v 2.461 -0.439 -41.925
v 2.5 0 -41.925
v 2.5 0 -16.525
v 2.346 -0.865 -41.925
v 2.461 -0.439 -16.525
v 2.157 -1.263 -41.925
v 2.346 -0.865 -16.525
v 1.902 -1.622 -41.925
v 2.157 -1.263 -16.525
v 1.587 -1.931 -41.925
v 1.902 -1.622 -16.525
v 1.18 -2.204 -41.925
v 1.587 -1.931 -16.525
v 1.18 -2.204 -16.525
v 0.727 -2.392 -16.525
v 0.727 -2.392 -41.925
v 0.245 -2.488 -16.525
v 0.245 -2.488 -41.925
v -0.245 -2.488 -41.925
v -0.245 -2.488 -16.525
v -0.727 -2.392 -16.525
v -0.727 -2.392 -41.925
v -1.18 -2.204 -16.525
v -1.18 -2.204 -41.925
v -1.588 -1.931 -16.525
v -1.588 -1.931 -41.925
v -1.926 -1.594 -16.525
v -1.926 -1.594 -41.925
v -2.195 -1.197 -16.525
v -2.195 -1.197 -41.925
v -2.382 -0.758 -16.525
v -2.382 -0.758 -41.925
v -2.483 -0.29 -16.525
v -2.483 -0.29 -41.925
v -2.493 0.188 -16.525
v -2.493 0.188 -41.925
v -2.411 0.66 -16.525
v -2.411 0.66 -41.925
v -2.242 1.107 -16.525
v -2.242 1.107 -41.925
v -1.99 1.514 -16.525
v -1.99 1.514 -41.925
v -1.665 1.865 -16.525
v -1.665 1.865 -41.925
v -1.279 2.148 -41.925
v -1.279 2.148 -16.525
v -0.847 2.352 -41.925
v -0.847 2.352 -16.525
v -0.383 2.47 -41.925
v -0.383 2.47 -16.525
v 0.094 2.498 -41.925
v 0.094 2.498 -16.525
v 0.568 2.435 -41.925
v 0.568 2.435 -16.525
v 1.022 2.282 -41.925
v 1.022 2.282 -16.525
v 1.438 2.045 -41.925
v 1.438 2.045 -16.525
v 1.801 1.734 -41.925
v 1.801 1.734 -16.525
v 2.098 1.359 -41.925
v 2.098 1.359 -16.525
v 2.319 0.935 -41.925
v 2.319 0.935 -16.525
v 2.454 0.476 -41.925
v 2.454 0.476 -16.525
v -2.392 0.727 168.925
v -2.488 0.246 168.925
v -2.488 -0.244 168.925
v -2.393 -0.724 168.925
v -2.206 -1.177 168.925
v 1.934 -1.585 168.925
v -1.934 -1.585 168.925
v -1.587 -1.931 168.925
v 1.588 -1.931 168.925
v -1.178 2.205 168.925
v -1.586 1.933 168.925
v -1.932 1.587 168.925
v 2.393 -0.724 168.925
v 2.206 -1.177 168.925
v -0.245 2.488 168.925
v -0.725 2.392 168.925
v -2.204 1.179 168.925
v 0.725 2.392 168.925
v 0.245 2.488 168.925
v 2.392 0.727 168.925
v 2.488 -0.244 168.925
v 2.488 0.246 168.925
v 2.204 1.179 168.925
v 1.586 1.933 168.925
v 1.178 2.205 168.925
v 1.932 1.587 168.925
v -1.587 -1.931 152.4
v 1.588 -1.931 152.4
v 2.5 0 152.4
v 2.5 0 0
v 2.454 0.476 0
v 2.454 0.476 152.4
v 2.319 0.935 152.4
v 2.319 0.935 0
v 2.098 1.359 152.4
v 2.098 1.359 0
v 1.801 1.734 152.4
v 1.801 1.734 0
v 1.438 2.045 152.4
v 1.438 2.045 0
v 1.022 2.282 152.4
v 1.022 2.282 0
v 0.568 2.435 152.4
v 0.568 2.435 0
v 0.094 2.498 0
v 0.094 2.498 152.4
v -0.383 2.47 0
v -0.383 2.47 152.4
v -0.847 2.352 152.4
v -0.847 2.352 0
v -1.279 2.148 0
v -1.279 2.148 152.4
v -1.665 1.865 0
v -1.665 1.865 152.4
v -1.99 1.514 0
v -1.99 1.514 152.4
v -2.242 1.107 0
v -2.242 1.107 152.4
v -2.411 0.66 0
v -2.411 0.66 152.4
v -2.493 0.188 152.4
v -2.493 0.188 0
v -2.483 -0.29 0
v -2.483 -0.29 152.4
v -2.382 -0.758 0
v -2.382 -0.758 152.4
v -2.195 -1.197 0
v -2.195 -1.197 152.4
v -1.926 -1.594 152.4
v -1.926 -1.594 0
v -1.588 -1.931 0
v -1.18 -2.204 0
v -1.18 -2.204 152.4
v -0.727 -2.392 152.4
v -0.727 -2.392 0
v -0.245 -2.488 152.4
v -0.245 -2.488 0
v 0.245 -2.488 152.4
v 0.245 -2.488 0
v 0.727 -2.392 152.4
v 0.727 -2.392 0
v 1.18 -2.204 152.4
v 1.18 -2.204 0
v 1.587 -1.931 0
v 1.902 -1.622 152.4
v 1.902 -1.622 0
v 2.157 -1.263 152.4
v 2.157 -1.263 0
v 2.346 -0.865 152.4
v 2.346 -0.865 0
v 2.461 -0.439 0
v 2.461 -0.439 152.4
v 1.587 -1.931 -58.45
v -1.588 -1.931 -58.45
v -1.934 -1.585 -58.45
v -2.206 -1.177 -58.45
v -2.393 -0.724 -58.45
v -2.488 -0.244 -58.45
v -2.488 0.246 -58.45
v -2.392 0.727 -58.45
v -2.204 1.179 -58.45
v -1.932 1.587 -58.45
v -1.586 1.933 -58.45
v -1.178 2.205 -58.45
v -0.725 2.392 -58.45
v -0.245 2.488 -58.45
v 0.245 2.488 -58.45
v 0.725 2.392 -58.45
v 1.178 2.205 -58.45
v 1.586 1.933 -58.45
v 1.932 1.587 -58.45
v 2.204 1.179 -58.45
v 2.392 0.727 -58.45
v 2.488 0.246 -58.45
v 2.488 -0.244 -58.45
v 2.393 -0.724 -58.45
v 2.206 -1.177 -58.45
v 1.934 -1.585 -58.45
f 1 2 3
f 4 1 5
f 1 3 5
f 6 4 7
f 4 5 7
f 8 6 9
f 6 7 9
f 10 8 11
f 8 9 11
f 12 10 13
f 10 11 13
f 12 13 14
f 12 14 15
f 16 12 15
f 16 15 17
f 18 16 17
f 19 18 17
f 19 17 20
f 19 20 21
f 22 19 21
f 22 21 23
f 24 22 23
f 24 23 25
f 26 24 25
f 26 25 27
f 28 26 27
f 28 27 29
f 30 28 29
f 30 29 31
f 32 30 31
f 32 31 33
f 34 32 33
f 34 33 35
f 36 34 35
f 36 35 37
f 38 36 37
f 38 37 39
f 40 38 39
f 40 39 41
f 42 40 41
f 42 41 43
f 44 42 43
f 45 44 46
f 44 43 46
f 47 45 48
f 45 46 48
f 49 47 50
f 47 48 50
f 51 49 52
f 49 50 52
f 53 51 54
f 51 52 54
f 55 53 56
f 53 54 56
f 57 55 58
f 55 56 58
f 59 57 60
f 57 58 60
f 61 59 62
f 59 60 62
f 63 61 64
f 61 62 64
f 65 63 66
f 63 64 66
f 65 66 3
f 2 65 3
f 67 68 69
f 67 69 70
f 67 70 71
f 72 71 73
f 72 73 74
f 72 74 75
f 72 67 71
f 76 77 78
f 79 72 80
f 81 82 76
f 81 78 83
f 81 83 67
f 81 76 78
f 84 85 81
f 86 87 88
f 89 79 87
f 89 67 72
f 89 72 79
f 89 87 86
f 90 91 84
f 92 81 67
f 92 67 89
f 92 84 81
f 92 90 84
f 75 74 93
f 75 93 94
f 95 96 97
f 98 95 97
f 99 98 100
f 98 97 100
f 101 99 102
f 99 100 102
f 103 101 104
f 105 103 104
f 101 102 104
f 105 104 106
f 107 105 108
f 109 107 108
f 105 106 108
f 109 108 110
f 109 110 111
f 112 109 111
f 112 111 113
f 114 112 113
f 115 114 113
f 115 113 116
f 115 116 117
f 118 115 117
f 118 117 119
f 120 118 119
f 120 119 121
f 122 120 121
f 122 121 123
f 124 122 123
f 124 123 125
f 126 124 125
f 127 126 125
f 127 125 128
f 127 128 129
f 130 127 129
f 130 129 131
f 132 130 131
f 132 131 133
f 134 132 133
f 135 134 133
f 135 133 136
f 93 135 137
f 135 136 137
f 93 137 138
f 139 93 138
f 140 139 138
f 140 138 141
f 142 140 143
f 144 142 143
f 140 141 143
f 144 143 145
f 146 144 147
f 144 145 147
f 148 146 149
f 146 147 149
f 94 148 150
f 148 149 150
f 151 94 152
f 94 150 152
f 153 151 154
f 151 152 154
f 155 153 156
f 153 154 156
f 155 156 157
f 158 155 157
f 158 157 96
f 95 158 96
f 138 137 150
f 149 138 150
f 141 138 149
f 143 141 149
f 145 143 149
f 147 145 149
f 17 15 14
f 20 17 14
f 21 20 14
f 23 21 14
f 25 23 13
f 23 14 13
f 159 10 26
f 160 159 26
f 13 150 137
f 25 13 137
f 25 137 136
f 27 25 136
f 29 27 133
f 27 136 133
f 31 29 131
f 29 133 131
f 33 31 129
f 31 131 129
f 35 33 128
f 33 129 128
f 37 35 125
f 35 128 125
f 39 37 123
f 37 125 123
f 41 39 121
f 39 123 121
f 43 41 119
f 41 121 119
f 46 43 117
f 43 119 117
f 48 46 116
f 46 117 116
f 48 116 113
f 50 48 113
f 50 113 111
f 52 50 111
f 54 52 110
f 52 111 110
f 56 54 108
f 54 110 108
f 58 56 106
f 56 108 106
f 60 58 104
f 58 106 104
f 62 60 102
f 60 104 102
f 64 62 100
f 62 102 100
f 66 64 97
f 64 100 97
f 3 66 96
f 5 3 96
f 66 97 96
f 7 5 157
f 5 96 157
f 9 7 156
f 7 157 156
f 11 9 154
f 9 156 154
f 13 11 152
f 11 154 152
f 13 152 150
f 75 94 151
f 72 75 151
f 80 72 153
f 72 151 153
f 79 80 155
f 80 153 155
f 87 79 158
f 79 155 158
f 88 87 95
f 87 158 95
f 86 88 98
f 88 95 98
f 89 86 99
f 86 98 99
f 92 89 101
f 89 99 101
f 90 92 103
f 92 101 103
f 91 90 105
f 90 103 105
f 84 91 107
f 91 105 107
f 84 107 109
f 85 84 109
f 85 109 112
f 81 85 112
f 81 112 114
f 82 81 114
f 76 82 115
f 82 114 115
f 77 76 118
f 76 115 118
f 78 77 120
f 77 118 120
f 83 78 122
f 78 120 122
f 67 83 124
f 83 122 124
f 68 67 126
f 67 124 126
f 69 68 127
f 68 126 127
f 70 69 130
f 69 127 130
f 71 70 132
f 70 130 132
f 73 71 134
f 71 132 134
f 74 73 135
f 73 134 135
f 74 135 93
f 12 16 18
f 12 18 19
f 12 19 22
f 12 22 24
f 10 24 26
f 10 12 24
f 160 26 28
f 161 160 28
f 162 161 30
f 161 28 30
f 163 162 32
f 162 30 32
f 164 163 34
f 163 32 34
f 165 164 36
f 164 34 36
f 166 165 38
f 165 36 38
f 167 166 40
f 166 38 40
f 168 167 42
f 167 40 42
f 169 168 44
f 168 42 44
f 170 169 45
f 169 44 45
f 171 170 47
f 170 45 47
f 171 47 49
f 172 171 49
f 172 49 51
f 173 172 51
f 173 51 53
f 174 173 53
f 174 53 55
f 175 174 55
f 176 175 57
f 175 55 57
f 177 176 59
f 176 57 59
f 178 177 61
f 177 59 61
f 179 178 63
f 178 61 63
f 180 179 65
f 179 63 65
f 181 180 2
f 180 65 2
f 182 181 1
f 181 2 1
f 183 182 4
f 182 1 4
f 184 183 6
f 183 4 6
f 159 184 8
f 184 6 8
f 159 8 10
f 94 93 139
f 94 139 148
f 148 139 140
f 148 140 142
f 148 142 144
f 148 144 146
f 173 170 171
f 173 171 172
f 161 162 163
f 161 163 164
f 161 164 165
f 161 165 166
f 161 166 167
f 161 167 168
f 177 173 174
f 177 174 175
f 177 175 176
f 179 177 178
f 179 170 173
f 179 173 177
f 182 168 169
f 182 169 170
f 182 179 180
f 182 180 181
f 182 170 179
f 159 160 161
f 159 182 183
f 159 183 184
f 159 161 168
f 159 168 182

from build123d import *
from build123d import SkipClean  # not in build123d's __all__

# Parameters (mm, degrees)
F0_R     = 2.5
F1_DEPTH = 152.4
F3_DEPTH = 16.5250114
F5_DEPTH = 16.5250114
F6_R     = 2.5
F7_DEPTH = 25.4
F9_DEPTH = 16.5250114


# Not quite as in the source:
# - after a boolean that leaves OpenCascade's solid faulty, fix() repairs it


with BuildPart() as f1:
    # F0 (on Top) → F1 (new body)
    with BuildSketch(Plane.XY):
        Circle(F0_R)
    extrude(amount=F1_DEPTH)

    # F2 (on face) → F3 (join)
    with BuildSketch(Plane.XY.offset(152.4)):
        with BuildLine():
            Line((0, -1.9312803396), (1.5875, -1.9312803396))
            ThreePointArc((1.5875, -1.9312803396), (0, 2.5), (-1.5875, -1.9312803396))
            Line((-1.5875, -1.9312803396), (0, -1.9312803396))
        make_face()
    extrude(amount=F3_DEPTH)

    # F4 (on face) → F5 (join)
    with BuildSketch(Plane(origin=(0, 0, 0), x_dir=(1, 0, 0), z_dir=(0, 0, -1))):
        with BuildLine():
            Line((1.5875, 1.9312803396), (-1.5875, 1.9312803396))
            ThreePointArc((-1.5875, 1.9312803396), (0, -2.5), (1.5875, 1.9312803396))
        make_face()
    with SkipClean():  # cleaning this boolean's faces spoils the solid; the shape is the same uncleaned
        extrude(amount=F5_DEPTH)

    # F6 (on face) → F7 (join)
    with BuildSketch(Plane(origin=(0, 0, -16.5250114), x_dir=(1, 0, 0), z_dir=(0, 0, -1))):
        Circle(F6_R)
    extrude(amount=F7_DEPTH)

    add(f1.part.fix(), mode=Mode.REPLACE)

    # F8 (on face) → F9 (join)
    with BuildSketch(Plane(origin=(0, 0, -41.9250114), x_dir=(1, 0, 0), z_dir=(0, 0, -1))):
        with BuildLine():
            Line((1.5875, 1.9312803396), (-1.5875, 1.9312803396))
            ThreePointArc((-1.5875, 1.9312803396), (0, -2.5), (1.5875, 1.9312803396))
        make_face()
    extrude(amount=F9_DEPTH)


solid = f1.part
